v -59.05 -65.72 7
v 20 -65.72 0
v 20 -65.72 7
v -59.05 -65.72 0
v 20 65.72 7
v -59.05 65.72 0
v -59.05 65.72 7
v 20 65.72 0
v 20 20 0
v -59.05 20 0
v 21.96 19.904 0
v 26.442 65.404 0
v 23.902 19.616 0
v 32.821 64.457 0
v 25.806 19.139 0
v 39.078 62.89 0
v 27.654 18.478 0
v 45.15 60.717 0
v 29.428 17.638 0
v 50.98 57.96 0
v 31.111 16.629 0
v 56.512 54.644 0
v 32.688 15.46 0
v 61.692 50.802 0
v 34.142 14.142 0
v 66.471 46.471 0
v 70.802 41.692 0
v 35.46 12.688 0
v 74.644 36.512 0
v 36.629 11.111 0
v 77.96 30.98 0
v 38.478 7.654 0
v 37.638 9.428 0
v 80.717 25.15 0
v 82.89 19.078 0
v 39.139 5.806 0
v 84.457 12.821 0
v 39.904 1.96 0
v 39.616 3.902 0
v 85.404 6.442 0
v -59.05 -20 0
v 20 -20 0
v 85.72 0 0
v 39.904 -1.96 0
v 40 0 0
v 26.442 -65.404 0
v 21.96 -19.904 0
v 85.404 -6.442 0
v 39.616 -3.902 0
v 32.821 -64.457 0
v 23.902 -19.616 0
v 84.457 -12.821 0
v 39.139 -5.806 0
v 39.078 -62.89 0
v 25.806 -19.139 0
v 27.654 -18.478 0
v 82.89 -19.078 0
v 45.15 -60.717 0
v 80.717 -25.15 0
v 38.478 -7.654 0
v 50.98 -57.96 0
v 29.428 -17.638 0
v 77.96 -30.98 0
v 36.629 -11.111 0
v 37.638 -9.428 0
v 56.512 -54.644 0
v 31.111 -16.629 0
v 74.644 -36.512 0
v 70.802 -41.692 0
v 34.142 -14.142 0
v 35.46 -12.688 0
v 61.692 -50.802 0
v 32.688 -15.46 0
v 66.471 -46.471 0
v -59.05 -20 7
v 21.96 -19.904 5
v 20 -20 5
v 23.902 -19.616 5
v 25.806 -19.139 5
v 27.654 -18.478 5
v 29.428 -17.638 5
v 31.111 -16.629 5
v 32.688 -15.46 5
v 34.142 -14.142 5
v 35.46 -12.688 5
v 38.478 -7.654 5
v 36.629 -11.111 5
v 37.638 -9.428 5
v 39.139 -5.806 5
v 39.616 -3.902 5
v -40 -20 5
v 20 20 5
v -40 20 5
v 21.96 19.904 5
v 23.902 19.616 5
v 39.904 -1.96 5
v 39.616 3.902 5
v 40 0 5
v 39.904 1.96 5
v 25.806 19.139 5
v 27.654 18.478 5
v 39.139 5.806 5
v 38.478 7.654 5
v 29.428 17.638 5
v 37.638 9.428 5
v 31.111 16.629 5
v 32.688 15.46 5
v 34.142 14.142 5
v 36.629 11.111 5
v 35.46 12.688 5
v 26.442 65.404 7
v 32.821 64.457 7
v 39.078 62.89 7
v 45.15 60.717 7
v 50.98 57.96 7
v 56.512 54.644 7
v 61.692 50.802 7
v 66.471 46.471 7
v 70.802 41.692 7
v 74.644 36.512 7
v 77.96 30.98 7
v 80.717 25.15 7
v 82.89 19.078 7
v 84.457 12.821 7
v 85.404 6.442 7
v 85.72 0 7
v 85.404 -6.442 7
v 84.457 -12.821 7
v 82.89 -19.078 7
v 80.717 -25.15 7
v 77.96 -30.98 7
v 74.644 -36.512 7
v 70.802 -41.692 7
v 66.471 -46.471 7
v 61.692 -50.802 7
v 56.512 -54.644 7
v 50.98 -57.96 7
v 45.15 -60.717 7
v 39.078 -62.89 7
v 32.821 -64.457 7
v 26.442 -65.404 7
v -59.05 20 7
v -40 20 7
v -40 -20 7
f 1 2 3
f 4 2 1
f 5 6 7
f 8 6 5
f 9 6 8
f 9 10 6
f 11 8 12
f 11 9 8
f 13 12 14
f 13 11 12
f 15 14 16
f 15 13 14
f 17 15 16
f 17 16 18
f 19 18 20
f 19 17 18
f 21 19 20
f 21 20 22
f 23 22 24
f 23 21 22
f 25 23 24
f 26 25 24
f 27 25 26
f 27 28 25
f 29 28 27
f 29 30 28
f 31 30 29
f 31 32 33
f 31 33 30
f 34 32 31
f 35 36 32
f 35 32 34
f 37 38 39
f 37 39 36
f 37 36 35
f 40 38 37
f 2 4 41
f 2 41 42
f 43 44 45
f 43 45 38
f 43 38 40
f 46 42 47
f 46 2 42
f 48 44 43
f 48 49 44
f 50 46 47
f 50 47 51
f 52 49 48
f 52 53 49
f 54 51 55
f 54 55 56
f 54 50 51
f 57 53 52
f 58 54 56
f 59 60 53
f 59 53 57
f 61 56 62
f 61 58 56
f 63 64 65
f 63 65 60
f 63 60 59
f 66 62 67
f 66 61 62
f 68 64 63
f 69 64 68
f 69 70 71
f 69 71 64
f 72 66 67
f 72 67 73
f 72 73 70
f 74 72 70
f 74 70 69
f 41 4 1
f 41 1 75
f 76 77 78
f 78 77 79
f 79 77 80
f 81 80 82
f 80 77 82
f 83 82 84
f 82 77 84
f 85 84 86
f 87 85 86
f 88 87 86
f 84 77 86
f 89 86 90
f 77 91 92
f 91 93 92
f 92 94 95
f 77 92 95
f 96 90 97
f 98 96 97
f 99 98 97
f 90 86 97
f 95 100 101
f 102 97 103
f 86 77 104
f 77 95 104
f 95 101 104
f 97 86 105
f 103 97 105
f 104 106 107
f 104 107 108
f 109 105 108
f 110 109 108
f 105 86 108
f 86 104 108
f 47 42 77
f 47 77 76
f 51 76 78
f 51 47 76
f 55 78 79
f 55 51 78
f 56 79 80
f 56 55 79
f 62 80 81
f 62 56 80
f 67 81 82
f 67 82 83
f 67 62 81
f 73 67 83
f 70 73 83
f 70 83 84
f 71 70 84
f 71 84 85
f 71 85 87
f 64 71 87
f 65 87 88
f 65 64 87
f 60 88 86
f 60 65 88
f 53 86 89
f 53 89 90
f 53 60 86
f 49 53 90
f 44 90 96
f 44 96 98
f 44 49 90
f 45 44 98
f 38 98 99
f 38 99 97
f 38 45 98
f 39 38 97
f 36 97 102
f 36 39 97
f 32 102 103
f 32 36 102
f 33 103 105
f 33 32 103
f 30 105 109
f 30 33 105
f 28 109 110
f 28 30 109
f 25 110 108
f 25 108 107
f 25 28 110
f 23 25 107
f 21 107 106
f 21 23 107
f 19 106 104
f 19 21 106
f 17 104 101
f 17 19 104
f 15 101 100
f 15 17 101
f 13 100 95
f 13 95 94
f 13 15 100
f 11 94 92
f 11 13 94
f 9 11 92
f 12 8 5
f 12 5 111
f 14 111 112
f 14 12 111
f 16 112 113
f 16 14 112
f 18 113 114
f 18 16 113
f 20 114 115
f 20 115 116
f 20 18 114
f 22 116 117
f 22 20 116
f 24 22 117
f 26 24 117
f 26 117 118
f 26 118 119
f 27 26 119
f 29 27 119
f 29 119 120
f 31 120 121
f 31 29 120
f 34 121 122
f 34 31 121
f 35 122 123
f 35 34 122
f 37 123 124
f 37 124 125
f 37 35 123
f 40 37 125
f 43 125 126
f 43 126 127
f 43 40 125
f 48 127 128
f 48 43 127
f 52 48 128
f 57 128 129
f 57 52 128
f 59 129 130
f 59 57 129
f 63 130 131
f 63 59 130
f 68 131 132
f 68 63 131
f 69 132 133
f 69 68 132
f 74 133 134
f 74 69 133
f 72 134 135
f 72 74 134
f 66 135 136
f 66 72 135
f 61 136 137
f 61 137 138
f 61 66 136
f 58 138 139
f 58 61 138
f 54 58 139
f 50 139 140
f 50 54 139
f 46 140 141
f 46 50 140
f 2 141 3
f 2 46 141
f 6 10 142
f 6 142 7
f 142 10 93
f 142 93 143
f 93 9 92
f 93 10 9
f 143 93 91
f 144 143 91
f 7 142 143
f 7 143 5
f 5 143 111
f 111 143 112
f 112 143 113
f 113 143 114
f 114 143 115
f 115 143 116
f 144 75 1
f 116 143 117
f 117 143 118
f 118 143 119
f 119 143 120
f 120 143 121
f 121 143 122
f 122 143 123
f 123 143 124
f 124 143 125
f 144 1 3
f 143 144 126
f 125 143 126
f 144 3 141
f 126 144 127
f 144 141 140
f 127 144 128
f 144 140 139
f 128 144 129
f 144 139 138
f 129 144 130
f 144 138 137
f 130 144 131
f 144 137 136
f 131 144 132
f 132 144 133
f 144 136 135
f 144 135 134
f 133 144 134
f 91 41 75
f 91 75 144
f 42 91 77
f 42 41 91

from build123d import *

# Parameters (mm, degrees)
F1_DEPTH = 7
F2_DEPTH = 5
F3_W     = 25.4
F3_H     = 7
F4_DEPTH = 19.05
F6_DEPTH = 7


with BuildPart() as f1:
    # F0 (on Top) → F1 (new body)
    with BuildSketch(Plane.XY):
        with BuildLine():
            ThreePointArc((20, 20), (40, 0), (20, -20))
            Line((20, -20), (-40, -20))
            Line((-40, -20), (-40, -45.4))
            Line((-40, -45.4), (20, -45.4))
            ThreePointArc((20, -45.4), (65.4, 0), (20, 45.4))
            Line((20, 45.4), (-40, 45.4))
            Line((-40, 45.4), (-40, 20))
            Line((-40, 20), (20, 20))
        make_face()
        with BuildLine():
            Line((-40, -20), (20, -20))
            ThreePointArc((20, -20), (40, 0), (20, 20))
            Line((20, 20), (-40, 20))
            Line((-40, 20), (-40, -20))
        make_face()
    extrude(amount=F1_DEPTH)

    # F0 (on Top) → F2 (cut)
    with BuildSketch(Plane.XY):
        with BuildLine():
            Line((-40, -20), (20, -20))
            ThreePointArc((20, -20), (40, 0), (20, 20))
            Line((20, 20), (-40, 20))
            Line((-40, 20), (-40, -20))
        make_face()
    extrude(amount=F2_DEPTH, mode=Mode.SUBTRACT)

    # F3 (on face) → F4 (join)
    with BuildSketch(Plane(origin=(-40, 0, 0), x_dir=(0, -1, 0), z_dir=(-1, 0, 0))):
        with Locations((-32.7, 3.5)):
            Rectangle(F3_W, F3_H)
        with Locations((32.7, 3.5)):
            Rectangle(F3_W, F3_H)
    extrude(amount=F4_DEPTH)

    # F5 (on face) → F6 (join, through all)
    with BuildSketch(Plane(origin=(0, 0, 0), x_dir=(1, 0, 0), z_dir=(0, 0, -1))):
        with BuildLine():
            Line((-59.05, -65.72), (20, -65.72))
            ThreePointArc((20, -65.72), (85.72, 0), (20, 65.72))
            Line((20, 65.72), (-59.05, 65.72))
            Line((-59.05, 65.72), (-59.05, 45.4))
            Line((-59.05, 45.4), (20, 45.4))
            ThreePointArc((20, 45.4), (65.4, 0), (20, -45.4))
            Line((20, -45.4), (-59.05, -45.4))
            Line((-59.05, -45.4), (-59.05, -65.72))
        make_face()
    extrude(amount=-F6_DEPTH)


solid = f1.part
